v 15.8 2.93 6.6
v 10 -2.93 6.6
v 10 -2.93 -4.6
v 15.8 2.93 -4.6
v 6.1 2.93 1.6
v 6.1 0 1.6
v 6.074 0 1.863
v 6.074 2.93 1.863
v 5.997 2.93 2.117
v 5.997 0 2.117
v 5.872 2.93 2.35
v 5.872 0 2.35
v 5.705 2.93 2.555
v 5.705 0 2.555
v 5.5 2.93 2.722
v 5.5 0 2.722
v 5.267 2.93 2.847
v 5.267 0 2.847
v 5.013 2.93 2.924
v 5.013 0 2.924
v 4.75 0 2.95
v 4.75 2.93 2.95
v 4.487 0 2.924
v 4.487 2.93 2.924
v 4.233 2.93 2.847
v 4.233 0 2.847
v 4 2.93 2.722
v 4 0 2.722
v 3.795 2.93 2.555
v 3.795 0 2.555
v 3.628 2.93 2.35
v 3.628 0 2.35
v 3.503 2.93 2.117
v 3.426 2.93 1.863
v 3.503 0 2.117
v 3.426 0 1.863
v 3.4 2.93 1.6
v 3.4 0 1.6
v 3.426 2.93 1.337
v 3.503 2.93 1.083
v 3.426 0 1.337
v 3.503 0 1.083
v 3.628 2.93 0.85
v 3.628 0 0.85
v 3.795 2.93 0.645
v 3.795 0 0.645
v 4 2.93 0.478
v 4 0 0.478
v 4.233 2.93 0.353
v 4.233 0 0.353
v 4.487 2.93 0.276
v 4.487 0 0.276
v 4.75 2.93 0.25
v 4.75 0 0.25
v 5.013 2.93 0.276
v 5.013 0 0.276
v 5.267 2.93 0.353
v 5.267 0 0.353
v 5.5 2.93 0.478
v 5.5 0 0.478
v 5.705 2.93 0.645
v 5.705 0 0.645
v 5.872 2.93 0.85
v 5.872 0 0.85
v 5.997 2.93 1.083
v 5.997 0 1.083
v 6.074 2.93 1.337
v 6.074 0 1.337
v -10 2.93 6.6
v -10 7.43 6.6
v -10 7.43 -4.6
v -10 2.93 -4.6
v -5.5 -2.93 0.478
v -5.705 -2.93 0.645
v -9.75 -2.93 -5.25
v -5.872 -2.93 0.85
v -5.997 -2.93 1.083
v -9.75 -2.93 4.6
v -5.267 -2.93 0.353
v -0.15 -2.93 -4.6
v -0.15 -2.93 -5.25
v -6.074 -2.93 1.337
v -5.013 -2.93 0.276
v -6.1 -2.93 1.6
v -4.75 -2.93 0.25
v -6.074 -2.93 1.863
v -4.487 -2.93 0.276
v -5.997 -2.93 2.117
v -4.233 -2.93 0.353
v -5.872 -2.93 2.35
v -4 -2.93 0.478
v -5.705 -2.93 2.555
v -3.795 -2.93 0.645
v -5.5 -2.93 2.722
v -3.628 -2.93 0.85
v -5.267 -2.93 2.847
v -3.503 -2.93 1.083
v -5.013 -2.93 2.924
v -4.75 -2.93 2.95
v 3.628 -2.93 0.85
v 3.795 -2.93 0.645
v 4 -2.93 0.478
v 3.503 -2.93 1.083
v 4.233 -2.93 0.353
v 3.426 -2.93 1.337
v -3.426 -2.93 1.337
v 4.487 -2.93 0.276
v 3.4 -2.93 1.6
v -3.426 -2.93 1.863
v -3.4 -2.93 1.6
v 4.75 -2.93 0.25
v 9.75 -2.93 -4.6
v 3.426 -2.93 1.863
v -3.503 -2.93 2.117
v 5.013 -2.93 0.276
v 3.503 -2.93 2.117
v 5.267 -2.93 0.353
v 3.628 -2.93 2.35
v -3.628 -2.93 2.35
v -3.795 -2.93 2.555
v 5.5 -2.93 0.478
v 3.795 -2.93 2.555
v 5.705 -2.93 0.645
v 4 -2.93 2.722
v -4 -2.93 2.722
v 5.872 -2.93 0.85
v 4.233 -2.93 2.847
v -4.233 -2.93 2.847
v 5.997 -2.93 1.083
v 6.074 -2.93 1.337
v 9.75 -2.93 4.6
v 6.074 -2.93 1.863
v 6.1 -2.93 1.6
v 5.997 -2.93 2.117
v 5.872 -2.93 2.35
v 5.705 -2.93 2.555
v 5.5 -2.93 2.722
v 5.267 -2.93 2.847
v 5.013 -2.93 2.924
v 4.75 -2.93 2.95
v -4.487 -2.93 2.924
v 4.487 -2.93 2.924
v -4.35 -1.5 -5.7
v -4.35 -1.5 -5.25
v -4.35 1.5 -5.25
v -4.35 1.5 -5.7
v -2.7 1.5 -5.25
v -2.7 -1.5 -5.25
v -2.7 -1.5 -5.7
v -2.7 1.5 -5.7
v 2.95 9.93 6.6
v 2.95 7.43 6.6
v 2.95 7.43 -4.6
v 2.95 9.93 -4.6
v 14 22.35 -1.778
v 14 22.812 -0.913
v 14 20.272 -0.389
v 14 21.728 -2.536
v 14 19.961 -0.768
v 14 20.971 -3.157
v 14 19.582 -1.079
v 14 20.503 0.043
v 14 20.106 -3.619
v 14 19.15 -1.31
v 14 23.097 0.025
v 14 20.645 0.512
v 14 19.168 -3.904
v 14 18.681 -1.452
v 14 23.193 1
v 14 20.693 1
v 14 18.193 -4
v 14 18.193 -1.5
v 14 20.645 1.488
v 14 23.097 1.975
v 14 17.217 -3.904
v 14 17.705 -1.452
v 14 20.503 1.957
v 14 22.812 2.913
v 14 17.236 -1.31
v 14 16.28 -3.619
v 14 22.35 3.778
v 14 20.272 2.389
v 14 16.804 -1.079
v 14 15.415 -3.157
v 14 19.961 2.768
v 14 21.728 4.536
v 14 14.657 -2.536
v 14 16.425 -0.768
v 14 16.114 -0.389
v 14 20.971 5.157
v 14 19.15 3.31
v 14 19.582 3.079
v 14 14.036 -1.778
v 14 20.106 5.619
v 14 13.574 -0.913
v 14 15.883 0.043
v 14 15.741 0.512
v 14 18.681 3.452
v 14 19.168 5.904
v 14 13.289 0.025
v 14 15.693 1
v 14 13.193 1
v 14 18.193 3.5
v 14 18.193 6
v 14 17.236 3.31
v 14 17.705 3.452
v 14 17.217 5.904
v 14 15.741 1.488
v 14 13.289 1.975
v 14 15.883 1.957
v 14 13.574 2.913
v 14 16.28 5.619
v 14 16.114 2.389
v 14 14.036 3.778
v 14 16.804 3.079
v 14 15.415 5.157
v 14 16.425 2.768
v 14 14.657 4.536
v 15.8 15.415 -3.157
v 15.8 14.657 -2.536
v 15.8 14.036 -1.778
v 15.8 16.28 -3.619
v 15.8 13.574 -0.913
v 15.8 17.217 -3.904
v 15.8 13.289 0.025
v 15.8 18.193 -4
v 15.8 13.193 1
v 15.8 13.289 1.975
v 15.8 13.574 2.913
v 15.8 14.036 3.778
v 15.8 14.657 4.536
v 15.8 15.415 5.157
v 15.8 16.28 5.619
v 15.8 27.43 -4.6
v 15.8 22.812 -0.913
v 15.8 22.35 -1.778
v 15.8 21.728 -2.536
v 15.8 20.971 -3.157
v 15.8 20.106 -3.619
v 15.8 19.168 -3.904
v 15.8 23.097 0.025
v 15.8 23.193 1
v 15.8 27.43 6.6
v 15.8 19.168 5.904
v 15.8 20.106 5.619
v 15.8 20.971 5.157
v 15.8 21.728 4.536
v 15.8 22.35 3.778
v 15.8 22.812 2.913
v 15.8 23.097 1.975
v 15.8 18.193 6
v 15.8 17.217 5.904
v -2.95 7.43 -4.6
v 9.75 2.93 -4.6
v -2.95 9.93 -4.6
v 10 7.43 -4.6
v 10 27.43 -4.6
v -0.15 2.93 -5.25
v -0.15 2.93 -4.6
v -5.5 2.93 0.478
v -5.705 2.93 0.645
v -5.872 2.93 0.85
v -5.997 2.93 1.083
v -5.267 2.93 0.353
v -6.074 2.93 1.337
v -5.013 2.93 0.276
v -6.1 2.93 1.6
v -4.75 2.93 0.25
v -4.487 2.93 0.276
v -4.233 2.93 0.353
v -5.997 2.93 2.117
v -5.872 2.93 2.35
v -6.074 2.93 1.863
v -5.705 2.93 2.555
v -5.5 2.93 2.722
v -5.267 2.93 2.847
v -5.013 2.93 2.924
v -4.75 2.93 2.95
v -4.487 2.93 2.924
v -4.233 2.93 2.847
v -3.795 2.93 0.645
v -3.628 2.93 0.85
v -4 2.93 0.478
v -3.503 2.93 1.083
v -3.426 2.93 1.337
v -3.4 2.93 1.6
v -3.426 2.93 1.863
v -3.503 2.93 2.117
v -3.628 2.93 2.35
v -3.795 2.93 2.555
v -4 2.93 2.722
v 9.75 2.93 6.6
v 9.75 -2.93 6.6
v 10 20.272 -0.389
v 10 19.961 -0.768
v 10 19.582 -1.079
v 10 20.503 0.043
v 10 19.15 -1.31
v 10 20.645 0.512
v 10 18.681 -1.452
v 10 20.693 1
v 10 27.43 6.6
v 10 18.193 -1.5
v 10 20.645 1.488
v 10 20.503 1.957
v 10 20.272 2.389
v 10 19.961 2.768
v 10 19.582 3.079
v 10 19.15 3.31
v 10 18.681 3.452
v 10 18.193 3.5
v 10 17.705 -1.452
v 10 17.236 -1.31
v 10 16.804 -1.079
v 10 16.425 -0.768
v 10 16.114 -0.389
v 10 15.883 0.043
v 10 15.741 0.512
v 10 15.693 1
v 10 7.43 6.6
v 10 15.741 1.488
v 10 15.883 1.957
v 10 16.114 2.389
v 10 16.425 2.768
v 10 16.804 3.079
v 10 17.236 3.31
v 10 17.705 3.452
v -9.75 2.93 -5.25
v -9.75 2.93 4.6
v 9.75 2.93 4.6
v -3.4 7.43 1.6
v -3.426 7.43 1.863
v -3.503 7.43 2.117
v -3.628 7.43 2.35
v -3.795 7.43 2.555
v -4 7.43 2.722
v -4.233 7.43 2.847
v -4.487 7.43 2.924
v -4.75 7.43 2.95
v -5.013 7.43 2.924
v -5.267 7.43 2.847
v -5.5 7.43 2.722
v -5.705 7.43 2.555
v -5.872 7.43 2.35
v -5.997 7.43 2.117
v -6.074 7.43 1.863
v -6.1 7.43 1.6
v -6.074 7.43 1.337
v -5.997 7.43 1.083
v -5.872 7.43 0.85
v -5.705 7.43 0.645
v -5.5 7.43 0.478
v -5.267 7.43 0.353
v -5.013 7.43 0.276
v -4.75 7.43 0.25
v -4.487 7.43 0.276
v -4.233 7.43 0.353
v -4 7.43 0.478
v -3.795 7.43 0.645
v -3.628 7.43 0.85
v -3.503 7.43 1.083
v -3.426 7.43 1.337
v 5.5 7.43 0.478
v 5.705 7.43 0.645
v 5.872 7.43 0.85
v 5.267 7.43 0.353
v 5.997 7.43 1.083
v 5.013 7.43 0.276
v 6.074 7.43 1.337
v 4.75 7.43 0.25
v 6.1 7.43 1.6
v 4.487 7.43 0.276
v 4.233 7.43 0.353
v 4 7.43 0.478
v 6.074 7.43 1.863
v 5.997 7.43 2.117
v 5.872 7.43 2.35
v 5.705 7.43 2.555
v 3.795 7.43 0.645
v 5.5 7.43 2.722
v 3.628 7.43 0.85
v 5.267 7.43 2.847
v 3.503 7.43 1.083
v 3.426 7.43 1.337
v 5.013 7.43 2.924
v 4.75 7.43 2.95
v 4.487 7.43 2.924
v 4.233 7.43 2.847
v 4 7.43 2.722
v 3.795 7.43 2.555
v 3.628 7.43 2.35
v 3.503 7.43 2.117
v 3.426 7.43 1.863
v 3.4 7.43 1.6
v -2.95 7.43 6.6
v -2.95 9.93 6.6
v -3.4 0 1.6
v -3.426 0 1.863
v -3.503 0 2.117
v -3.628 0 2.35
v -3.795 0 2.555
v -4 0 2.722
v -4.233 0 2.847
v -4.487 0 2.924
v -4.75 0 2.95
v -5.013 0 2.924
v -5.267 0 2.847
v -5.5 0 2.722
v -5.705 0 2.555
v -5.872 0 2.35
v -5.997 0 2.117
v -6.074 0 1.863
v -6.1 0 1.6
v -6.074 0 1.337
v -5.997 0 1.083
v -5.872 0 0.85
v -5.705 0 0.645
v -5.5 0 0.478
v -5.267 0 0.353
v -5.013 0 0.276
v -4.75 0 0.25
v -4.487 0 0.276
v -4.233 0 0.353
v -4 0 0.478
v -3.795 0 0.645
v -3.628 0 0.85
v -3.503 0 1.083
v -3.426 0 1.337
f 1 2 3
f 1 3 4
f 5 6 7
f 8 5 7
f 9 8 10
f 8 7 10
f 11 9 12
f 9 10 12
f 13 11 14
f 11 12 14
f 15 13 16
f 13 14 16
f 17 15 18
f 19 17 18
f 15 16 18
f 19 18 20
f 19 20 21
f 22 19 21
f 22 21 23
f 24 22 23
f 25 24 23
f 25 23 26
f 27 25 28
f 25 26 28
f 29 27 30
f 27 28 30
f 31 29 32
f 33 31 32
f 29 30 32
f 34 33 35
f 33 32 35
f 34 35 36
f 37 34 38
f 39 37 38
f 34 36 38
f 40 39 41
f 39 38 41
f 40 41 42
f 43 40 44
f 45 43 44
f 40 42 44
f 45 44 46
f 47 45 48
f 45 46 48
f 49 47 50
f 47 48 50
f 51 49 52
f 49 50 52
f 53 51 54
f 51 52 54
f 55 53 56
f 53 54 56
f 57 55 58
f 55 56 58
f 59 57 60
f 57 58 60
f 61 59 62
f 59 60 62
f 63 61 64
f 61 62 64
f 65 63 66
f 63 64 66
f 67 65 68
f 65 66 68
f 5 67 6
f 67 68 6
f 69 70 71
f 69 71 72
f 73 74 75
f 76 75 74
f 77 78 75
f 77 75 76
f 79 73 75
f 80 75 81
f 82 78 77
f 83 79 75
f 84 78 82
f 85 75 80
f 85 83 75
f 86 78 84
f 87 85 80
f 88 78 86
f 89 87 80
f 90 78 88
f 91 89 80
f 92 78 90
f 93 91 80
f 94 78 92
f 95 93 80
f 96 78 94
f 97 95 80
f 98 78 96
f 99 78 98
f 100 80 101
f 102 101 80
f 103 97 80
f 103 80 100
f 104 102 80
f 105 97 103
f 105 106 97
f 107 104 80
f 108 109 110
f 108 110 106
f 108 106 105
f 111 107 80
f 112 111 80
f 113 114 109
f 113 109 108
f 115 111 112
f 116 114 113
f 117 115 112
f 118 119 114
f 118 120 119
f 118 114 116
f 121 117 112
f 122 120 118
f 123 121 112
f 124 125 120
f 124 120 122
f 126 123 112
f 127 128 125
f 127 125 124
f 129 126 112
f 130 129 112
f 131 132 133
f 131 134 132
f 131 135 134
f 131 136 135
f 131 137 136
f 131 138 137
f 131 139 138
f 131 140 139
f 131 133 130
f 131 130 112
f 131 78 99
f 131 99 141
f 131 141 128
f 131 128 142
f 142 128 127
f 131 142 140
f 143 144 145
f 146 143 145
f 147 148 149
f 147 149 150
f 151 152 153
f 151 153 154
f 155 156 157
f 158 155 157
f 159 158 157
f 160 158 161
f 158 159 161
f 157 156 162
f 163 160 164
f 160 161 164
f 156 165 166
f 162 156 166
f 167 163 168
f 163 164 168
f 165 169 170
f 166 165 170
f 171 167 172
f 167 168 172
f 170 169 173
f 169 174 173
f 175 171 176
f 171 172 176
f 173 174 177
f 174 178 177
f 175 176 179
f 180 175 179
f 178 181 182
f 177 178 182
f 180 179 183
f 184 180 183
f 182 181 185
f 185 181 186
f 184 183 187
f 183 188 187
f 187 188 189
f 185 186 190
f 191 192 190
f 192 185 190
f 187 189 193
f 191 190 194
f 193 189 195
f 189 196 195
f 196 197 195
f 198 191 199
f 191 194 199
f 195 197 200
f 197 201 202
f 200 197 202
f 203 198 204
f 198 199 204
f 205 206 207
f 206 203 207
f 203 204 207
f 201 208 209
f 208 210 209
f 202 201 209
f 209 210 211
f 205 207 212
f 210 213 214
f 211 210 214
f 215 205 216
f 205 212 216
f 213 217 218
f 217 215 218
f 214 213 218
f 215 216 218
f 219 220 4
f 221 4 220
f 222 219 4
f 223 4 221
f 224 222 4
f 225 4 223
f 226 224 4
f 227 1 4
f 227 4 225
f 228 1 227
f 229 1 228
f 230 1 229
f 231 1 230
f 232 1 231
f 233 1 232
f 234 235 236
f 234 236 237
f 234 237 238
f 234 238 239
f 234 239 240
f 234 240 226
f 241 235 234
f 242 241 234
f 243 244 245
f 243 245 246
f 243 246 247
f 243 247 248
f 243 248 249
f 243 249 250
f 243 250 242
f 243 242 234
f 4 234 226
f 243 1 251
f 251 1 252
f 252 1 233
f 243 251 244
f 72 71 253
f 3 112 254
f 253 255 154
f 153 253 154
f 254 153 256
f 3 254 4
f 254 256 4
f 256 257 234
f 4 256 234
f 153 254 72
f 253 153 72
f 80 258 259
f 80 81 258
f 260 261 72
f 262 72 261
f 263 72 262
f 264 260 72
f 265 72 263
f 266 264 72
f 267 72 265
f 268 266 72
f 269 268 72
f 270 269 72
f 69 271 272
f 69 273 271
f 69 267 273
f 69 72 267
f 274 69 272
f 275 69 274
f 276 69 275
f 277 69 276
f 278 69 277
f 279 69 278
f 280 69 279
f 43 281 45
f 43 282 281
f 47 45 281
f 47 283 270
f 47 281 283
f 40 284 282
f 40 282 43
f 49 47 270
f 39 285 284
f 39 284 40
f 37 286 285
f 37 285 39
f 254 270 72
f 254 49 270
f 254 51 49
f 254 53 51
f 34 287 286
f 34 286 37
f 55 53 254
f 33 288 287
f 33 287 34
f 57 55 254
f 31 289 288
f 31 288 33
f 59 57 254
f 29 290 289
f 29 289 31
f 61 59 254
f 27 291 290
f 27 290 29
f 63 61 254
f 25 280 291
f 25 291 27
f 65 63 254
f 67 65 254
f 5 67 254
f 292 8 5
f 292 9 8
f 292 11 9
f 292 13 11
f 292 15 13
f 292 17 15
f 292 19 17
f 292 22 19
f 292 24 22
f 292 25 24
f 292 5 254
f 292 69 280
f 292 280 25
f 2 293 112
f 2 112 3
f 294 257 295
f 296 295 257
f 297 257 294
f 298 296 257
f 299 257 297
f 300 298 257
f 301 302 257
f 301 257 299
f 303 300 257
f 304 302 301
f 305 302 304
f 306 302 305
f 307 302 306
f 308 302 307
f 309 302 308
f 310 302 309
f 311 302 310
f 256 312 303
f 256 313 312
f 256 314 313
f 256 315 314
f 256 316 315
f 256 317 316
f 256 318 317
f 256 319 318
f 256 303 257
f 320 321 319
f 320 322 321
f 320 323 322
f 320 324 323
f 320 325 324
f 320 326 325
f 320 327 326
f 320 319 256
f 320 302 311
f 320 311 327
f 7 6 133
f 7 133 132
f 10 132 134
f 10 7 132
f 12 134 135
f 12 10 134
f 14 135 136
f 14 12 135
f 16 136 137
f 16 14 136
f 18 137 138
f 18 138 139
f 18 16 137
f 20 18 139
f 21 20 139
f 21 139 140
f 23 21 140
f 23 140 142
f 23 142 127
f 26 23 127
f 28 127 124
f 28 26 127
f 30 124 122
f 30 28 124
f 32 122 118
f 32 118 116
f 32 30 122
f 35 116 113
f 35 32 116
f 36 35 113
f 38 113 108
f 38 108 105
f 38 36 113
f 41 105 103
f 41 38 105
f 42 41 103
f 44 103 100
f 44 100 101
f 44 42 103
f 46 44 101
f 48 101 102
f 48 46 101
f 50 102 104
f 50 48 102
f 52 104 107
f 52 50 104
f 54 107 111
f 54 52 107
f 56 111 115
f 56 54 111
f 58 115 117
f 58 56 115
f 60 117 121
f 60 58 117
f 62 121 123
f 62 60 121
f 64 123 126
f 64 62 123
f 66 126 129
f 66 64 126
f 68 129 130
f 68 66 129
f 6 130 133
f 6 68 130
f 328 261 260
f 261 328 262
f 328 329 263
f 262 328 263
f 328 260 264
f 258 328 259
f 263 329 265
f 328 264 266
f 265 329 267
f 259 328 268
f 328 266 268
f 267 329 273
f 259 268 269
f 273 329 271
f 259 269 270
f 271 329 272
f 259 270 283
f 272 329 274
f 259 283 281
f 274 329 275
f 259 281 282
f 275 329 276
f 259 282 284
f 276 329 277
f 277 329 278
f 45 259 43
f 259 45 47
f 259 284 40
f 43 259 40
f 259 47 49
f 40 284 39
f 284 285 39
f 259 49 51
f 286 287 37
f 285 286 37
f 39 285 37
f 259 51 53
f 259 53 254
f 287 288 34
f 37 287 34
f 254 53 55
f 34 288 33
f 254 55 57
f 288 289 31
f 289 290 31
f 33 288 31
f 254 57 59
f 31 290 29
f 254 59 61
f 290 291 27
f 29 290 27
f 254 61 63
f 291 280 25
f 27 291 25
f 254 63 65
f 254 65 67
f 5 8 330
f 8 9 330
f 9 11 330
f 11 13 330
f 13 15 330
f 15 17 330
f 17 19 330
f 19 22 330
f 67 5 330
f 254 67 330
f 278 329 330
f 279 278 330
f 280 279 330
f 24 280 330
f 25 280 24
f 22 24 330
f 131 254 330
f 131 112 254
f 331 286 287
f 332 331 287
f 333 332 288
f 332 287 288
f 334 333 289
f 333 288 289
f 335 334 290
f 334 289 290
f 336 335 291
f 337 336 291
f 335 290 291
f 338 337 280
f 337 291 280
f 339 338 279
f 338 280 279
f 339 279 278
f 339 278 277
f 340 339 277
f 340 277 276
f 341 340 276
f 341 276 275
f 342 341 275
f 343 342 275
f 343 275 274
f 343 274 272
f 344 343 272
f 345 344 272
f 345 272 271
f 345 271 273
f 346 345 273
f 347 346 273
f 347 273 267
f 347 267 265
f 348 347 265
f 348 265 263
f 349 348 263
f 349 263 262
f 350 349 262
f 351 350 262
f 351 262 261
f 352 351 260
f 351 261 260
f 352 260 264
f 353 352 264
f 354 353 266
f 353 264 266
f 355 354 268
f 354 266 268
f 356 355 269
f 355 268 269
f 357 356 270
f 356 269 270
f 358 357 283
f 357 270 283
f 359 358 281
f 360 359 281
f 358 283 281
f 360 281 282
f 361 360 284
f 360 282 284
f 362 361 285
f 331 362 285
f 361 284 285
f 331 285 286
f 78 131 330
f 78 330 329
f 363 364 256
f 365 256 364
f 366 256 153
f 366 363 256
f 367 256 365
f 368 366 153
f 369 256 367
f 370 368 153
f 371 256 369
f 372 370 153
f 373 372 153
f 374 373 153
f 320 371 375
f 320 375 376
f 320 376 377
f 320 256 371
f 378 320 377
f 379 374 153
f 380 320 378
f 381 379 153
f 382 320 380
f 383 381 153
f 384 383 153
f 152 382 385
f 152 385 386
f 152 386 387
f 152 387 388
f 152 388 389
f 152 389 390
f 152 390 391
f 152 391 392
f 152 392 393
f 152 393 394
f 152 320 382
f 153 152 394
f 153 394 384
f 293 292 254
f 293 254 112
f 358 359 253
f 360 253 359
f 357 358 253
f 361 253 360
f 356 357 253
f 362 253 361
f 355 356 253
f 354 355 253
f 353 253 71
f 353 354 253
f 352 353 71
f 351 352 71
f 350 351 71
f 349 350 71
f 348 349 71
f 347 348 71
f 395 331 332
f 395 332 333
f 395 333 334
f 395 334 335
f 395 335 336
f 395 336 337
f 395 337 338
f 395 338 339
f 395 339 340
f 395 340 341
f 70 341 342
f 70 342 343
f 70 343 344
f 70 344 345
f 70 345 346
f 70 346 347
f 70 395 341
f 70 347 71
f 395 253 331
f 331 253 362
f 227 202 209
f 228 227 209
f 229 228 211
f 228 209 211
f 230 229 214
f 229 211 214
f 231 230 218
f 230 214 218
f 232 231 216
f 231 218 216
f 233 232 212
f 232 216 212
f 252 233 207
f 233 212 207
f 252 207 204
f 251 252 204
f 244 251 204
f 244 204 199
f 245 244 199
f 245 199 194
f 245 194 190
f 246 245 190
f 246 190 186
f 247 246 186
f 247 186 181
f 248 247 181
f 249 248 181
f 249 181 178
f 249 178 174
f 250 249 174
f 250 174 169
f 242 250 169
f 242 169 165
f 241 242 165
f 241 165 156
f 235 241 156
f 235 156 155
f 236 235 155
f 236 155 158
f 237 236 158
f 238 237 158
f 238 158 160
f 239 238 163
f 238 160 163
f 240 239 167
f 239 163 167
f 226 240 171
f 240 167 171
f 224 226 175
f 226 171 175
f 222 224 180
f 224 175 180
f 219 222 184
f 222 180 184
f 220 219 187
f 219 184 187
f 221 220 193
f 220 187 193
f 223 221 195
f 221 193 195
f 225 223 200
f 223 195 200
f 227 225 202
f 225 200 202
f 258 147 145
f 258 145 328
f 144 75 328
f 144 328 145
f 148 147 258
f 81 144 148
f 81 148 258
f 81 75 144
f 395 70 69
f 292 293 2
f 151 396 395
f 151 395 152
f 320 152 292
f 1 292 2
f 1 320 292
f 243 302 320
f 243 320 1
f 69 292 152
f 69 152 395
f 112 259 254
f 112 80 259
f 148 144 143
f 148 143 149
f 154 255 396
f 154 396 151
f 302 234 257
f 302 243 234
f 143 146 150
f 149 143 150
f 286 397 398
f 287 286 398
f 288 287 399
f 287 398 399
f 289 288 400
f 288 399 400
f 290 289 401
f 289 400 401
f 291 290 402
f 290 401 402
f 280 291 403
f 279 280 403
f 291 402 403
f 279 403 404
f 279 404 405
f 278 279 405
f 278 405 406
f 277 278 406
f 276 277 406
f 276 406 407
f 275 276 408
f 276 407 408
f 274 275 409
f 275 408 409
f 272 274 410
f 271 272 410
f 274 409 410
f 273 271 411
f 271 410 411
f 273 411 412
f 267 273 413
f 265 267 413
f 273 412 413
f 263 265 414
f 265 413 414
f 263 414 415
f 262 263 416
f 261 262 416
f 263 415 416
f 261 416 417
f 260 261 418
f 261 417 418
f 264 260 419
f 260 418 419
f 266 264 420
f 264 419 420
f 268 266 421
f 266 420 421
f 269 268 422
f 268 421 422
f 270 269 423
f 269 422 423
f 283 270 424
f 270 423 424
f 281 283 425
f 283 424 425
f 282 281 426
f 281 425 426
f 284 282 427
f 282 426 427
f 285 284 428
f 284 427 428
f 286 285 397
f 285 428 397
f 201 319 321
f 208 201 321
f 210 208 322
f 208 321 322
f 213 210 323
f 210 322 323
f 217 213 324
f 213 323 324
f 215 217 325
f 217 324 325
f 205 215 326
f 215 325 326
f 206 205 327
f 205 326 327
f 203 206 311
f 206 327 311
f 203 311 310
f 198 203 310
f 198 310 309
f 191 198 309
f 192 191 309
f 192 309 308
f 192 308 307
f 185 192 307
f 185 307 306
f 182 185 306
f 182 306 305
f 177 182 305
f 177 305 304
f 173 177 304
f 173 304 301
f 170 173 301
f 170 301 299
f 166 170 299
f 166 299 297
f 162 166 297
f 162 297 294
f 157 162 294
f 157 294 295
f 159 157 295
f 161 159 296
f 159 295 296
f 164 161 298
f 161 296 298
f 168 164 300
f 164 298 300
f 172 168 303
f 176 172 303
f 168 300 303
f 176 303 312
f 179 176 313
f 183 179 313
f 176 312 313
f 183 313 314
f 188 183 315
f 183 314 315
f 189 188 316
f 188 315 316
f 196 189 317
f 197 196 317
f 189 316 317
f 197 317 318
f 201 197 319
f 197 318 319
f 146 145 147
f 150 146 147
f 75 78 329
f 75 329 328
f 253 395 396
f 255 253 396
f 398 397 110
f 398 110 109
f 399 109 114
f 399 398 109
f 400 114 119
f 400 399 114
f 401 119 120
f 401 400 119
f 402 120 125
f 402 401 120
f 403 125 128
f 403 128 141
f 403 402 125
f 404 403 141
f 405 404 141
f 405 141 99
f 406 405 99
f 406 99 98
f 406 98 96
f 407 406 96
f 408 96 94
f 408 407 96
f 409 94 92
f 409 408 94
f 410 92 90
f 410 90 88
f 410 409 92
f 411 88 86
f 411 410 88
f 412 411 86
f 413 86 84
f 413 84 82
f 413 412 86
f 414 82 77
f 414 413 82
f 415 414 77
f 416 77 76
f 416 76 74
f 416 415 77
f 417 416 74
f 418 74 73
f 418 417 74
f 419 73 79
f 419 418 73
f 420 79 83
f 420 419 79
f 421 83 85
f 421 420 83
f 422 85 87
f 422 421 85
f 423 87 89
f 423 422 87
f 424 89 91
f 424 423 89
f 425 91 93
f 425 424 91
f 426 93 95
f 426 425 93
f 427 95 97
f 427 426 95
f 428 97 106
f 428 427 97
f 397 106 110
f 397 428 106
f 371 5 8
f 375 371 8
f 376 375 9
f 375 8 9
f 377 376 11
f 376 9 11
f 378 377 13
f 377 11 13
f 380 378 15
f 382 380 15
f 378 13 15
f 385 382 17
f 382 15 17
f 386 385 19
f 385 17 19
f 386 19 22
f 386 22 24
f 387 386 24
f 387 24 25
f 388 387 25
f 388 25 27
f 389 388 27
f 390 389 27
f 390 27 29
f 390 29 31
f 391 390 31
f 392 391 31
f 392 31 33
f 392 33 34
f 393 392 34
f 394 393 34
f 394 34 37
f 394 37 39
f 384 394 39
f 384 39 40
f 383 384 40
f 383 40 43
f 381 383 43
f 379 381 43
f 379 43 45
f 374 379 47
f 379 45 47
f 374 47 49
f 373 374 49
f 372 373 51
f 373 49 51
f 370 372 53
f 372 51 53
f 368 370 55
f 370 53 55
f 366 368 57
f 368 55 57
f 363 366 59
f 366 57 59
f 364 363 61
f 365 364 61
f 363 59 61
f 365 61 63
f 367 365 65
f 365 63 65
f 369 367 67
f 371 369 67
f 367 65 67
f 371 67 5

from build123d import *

# Parameters (mm, degrees)
F0_R          = 1.35
F0_W          = 9.6
F0_H          = 0.65
F1_DEPTH      = 2.93
F1_DEPTH_BACK = 2.93
F2_W          = 1.65
F2_H          = 3
F3_DEPTH      = 5.7
F4_W          = 5.9
F4_H          = 2.5
F5_DEPTH      = 6.6
F5_DEPTH_BACK = 4.6
F6_DEPTH      = 25
F8_R          = 2.5
F9_DEPTH      = 25
F10_START     = -4
F8_R_2        = 5
F10_DEPTH     = 21


with BuildPart() as f1:
    # F0 (on Front) → F1 (new body, two sides)
    with BuildSketch(Plane.XZ) as f1_sk:
        Polygon((-0.15, -4.6), (9.75, -4.6), (9.75, 4.6), (-9.75, 4.6), (-9.75, -4.6), align=None)
        with Locations((-4.75, 1.6)):
            Circle(F0_R, mode=Mode.SUBTRACT)
        with Locations((4.75, 1.6)):
            Circle(F0_R, mode=Mode.SUBTRACT)
        with Locations((-4.95, -4.925)):
            Rectangle(F0_W, F0_H)
    extrude(amount=F1_DEPTH)
    extrude(f1_sk.sketch, amount=-F1_DEPTH_BACK)

    # F2 (on Top) → F3 (join)
    with BuildSketch(Plane.XY):
        with Locations((-3.525, 0)):
            Rectangle(F2_W, F2_H)
    extrude(amount=-F3_DEPTH)


with BuildPart() as f5:
    # F4 (on Top) → F5 (new body, two sides)
    with BuildSketch(Plane.XY) as f5_sk:
        Polygon((9.75, 2.93), (10, 2.93), (10, 7.43), (2.95, 7.43), (-2.95, 7.43), (-10, 7.43), (-10, 2.93), align=None)
        Polygon((11.3, 2.93), (10, 2.93), (9.75, 2.93), (9.75, -2.93), (10, -2.93), (15.8, 2.93), align=None)
        Polygon((10, 7.43), (10, 2.93), (11.3, 2.93), (15.8, 2.93), (15.8, 27.43), (10, 27.43), align=None)
        with Locations((0, 8.68)):
            Rectangle(F4_W, F4_H)
    extrude(amount=F5_DEPTH)
    extrude(f5_sk.sketch, amount=-F5_DEPTH_BACK)

    # F0 (on Front) → F6 (cut)
    with BuildSketch(Plane.XZ):
        with Locations((-4.75, 1.6)):
            Circle(F0_R)
        with Locations((4.75, 1.6)):
            Circle(F0_R)
    extrude(amount=-F6_DEPTH, mode=Mode.SUBTRACT)

    # F8 (on offset) → F9 (cut)
    with BuildSketch(Plane(origin=(10, 0, 0), x_dir=(0, -1, 0), z_dir=(-1, 0, 0))):
        with Locations((-18.1929276971, 1)):
            Circle(F8_R)
    extrude(amount=-F9_DEPTH, mode=Mode.SUBTRACT)

    # F8 (on offset) → F10 (cut)
    with BuildSketch(Plane(origin=(10, 0, 0), x_dir=(0, -1, 0), z_dir=(-1, 0, 0)).offset(F10_START)):
        with Locations((-18.1929276971, 1)):
            Circle(F8_R_2)
        with Locations((-18.1929276971, 1)):
            Circle(F8_R, mode=Mode.SUBTRACT)
    extrude(amount=-F10_DEPTH, mode=Mode.SUBTRACT)


solid = Compound([f1.part, f5.part])
